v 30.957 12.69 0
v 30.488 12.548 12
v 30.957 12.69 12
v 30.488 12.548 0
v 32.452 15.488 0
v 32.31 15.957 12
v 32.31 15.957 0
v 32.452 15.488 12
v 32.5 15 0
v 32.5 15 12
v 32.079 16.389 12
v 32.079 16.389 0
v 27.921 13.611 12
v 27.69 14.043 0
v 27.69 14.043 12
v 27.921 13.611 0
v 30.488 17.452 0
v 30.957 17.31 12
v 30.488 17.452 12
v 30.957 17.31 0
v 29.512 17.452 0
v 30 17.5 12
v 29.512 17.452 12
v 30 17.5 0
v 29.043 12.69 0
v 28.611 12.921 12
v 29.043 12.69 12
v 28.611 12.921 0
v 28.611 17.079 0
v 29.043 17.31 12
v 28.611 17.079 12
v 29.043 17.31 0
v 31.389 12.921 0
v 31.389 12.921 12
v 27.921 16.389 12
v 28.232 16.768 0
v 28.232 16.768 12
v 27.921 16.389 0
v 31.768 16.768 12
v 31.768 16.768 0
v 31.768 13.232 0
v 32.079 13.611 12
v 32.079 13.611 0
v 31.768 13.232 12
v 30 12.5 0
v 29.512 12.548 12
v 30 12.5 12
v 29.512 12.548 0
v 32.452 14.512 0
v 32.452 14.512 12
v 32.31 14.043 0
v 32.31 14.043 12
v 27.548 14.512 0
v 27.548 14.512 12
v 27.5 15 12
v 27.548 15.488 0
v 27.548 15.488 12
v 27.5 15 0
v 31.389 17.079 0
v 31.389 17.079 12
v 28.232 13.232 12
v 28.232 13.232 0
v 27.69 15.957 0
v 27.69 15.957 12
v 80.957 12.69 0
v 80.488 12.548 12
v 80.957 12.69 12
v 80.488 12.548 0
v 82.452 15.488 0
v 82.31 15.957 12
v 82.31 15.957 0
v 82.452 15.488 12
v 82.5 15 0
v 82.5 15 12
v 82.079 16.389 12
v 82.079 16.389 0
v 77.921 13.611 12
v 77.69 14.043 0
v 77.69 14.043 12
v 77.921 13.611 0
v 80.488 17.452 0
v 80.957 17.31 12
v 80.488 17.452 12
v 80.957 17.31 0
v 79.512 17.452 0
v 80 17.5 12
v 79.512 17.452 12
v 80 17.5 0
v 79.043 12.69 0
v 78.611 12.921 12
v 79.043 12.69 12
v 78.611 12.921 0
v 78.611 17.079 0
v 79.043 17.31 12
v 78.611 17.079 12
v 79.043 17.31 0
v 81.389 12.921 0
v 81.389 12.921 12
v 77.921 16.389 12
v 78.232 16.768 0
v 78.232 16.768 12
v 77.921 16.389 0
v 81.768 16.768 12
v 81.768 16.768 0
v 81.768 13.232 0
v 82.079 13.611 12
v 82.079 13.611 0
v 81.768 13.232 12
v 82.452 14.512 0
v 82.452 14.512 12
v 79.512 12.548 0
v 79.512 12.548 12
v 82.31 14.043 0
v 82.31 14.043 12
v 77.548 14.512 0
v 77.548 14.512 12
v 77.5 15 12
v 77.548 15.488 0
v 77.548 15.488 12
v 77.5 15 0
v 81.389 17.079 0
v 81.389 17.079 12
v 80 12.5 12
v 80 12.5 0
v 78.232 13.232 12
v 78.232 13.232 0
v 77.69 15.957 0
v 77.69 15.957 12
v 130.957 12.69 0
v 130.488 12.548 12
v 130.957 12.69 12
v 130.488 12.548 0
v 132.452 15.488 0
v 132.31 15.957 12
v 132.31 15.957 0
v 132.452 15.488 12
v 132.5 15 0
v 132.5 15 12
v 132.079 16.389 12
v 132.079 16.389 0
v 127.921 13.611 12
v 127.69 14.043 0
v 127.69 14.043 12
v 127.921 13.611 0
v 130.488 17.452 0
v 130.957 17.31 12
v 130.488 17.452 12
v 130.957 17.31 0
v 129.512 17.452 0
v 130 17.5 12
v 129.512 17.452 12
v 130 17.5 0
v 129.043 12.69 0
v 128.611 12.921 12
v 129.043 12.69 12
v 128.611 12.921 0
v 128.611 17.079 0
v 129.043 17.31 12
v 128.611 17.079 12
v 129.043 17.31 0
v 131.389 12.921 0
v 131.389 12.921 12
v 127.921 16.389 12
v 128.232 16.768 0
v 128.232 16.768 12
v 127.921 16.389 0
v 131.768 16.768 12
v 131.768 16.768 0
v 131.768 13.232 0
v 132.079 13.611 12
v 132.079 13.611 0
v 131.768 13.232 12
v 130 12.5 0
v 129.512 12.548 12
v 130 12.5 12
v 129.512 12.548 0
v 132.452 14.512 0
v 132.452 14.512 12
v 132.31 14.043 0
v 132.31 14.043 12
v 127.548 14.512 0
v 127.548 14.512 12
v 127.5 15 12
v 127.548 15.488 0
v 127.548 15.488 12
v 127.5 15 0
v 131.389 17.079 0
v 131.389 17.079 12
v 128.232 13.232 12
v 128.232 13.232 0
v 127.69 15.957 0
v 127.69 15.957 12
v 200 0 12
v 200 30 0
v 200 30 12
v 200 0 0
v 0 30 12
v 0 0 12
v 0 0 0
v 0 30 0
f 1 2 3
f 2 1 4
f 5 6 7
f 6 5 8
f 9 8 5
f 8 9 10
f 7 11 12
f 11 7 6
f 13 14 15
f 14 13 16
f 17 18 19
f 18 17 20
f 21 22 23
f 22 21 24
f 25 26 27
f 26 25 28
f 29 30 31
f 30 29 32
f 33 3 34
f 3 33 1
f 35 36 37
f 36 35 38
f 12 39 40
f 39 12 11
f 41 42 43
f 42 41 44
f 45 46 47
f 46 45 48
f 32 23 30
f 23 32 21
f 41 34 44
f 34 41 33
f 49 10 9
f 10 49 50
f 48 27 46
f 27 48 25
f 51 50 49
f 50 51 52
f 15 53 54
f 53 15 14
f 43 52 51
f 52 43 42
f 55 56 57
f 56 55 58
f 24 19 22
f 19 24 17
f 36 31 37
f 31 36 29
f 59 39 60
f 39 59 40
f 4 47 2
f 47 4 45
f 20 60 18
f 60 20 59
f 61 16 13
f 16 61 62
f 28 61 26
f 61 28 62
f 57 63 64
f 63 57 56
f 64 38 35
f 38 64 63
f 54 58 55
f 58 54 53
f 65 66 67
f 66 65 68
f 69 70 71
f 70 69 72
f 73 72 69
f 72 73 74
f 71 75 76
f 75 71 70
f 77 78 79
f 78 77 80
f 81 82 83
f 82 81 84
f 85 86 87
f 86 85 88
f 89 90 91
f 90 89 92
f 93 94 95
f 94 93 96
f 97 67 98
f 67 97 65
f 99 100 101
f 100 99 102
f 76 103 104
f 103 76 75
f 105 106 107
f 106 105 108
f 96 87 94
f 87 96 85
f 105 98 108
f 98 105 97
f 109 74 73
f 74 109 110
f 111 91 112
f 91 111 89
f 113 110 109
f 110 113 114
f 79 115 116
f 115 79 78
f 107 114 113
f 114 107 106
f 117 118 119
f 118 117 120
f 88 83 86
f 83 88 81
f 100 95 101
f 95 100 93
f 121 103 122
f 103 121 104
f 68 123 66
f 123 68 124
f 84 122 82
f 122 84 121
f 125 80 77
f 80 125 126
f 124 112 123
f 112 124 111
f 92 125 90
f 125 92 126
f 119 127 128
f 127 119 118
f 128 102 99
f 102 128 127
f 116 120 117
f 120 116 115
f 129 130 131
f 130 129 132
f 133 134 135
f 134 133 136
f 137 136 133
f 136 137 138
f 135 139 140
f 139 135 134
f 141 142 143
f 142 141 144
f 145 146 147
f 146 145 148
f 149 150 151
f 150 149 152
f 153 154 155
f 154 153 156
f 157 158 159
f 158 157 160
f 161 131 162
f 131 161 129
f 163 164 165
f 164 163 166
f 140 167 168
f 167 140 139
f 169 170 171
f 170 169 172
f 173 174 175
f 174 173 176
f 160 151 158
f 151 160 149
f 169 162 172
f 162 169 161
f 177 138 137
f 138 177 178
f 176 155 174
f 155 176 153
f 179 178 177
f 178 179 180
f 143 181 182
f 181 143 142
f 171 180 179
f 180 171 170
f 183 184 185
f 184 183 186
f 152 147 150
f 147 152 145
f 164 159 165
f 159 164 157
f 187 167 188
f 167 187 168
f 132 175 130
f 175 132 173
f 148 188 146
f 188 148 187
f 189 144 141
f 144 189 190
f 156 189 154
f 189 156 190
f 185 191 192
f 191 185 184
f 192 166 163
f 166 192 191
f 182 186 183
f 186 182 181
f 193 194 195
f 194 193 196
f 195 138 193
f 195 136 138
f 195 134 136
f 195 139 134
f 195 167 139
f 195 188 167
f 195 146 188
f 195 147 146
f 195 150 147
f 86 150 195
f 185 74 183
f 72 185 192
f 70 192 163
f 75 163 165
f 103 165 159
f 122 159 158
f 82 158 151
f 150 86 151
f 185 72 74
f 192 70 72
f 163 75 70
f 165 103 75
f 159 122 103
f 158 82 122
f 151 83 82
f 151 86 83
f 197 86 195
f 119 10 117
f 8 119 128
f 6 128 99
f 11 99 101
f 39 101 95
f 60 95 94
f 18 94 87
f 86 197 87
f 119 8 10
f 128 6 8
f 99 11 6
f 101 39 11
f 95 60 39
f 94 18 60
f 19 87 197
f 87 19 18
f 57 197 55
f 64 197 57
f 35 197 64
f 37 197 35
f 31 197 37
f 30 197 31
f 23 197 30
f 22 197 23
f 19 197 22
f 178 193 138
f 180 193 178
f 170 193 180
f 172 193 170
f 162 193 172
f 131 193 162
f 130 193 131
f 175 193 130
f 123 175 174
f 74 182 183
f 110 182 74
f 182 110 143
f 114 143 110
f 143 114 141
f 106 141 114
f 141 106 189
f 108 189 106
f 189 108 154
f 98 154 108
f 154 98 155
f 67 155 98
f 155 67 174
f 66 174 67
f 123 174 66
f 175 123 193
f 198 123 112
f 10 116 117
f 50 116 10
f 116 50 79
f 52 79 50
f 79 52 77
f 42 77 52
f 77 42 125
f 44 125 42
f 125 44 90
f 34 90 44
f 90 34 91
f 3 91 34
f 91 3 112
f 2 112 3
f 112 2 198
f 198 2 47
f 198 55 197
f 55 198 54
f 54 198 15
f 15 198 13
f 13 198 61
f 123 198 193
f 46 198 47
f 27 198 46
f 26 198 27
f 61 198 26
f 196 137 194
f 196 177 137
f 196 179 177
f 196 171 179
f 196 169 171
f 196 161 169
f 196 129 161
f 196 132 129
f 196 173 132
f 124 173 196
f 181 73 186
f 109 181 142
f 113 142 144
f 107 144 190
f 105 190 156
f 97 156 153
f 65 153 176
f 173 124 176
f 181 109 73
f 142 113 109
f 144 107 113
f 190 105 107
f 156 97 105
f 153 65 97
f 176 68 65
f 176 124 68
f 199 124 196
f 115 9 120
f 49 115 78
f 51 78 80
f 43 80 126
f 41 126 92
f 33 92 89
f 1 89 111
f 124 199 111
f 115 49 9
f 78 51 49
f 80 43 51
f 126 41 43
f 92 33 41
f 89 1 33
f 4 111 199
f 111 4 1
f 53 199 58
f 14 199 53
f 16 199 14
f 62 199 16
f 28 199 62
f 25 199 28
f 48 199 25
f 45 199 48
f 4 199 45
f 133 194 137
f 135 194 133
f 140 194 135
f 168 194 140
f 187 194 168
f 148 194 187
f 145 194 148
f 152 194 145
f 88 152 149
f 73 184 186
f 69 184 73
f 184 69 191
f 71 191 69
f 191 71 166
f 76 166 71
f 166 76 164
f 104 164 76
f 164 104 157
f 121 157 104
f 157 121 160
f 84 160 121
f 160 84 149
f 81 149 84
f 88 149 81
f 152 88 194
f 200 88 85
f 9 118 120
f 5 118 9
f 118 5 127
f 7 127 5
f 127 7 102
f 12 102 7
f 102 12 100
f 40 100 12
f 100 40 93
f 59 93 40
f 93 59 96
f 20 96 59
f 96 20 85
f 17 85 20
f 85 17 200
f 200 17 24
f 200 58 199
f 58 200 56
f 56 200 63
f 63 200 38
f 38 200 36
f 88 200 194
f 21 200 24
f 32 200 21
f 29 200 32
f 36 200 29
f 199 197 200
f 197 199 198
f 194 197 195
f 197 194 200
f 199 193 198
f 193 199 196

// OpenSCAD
$fn = 32;

// ----------------------------------------------------------------------
// Long rail: 200-250 mm mounting rail
// ----------------------------------------------------------------------

// --- parameters (mm) ---
rail_l = 200;             // rail length, X
rail_w = 30;              // rail width, Y
rail_t = 12;              // rail thickness, Z
hole_d = 5;               // mounting hole diameter
hole_start = 30;          // first hole offset from the end
hole_pitch = 50;          // hole pitch
holes = 3;                // number of holes
fit_tol = 0.1;            // tolerance for press fits, mm
free_tol = 0.5;           // tolerance for clearance fits, mm

difference() {
  cube([rail_l, rail_w, rail_t]);
  for (i = [0 : holes - 1])
    translate([hole_start + i * hole_pitch, rail_w / 2, -1])
      cylinder(h = rail_t + 2, d = hole_d);
}
